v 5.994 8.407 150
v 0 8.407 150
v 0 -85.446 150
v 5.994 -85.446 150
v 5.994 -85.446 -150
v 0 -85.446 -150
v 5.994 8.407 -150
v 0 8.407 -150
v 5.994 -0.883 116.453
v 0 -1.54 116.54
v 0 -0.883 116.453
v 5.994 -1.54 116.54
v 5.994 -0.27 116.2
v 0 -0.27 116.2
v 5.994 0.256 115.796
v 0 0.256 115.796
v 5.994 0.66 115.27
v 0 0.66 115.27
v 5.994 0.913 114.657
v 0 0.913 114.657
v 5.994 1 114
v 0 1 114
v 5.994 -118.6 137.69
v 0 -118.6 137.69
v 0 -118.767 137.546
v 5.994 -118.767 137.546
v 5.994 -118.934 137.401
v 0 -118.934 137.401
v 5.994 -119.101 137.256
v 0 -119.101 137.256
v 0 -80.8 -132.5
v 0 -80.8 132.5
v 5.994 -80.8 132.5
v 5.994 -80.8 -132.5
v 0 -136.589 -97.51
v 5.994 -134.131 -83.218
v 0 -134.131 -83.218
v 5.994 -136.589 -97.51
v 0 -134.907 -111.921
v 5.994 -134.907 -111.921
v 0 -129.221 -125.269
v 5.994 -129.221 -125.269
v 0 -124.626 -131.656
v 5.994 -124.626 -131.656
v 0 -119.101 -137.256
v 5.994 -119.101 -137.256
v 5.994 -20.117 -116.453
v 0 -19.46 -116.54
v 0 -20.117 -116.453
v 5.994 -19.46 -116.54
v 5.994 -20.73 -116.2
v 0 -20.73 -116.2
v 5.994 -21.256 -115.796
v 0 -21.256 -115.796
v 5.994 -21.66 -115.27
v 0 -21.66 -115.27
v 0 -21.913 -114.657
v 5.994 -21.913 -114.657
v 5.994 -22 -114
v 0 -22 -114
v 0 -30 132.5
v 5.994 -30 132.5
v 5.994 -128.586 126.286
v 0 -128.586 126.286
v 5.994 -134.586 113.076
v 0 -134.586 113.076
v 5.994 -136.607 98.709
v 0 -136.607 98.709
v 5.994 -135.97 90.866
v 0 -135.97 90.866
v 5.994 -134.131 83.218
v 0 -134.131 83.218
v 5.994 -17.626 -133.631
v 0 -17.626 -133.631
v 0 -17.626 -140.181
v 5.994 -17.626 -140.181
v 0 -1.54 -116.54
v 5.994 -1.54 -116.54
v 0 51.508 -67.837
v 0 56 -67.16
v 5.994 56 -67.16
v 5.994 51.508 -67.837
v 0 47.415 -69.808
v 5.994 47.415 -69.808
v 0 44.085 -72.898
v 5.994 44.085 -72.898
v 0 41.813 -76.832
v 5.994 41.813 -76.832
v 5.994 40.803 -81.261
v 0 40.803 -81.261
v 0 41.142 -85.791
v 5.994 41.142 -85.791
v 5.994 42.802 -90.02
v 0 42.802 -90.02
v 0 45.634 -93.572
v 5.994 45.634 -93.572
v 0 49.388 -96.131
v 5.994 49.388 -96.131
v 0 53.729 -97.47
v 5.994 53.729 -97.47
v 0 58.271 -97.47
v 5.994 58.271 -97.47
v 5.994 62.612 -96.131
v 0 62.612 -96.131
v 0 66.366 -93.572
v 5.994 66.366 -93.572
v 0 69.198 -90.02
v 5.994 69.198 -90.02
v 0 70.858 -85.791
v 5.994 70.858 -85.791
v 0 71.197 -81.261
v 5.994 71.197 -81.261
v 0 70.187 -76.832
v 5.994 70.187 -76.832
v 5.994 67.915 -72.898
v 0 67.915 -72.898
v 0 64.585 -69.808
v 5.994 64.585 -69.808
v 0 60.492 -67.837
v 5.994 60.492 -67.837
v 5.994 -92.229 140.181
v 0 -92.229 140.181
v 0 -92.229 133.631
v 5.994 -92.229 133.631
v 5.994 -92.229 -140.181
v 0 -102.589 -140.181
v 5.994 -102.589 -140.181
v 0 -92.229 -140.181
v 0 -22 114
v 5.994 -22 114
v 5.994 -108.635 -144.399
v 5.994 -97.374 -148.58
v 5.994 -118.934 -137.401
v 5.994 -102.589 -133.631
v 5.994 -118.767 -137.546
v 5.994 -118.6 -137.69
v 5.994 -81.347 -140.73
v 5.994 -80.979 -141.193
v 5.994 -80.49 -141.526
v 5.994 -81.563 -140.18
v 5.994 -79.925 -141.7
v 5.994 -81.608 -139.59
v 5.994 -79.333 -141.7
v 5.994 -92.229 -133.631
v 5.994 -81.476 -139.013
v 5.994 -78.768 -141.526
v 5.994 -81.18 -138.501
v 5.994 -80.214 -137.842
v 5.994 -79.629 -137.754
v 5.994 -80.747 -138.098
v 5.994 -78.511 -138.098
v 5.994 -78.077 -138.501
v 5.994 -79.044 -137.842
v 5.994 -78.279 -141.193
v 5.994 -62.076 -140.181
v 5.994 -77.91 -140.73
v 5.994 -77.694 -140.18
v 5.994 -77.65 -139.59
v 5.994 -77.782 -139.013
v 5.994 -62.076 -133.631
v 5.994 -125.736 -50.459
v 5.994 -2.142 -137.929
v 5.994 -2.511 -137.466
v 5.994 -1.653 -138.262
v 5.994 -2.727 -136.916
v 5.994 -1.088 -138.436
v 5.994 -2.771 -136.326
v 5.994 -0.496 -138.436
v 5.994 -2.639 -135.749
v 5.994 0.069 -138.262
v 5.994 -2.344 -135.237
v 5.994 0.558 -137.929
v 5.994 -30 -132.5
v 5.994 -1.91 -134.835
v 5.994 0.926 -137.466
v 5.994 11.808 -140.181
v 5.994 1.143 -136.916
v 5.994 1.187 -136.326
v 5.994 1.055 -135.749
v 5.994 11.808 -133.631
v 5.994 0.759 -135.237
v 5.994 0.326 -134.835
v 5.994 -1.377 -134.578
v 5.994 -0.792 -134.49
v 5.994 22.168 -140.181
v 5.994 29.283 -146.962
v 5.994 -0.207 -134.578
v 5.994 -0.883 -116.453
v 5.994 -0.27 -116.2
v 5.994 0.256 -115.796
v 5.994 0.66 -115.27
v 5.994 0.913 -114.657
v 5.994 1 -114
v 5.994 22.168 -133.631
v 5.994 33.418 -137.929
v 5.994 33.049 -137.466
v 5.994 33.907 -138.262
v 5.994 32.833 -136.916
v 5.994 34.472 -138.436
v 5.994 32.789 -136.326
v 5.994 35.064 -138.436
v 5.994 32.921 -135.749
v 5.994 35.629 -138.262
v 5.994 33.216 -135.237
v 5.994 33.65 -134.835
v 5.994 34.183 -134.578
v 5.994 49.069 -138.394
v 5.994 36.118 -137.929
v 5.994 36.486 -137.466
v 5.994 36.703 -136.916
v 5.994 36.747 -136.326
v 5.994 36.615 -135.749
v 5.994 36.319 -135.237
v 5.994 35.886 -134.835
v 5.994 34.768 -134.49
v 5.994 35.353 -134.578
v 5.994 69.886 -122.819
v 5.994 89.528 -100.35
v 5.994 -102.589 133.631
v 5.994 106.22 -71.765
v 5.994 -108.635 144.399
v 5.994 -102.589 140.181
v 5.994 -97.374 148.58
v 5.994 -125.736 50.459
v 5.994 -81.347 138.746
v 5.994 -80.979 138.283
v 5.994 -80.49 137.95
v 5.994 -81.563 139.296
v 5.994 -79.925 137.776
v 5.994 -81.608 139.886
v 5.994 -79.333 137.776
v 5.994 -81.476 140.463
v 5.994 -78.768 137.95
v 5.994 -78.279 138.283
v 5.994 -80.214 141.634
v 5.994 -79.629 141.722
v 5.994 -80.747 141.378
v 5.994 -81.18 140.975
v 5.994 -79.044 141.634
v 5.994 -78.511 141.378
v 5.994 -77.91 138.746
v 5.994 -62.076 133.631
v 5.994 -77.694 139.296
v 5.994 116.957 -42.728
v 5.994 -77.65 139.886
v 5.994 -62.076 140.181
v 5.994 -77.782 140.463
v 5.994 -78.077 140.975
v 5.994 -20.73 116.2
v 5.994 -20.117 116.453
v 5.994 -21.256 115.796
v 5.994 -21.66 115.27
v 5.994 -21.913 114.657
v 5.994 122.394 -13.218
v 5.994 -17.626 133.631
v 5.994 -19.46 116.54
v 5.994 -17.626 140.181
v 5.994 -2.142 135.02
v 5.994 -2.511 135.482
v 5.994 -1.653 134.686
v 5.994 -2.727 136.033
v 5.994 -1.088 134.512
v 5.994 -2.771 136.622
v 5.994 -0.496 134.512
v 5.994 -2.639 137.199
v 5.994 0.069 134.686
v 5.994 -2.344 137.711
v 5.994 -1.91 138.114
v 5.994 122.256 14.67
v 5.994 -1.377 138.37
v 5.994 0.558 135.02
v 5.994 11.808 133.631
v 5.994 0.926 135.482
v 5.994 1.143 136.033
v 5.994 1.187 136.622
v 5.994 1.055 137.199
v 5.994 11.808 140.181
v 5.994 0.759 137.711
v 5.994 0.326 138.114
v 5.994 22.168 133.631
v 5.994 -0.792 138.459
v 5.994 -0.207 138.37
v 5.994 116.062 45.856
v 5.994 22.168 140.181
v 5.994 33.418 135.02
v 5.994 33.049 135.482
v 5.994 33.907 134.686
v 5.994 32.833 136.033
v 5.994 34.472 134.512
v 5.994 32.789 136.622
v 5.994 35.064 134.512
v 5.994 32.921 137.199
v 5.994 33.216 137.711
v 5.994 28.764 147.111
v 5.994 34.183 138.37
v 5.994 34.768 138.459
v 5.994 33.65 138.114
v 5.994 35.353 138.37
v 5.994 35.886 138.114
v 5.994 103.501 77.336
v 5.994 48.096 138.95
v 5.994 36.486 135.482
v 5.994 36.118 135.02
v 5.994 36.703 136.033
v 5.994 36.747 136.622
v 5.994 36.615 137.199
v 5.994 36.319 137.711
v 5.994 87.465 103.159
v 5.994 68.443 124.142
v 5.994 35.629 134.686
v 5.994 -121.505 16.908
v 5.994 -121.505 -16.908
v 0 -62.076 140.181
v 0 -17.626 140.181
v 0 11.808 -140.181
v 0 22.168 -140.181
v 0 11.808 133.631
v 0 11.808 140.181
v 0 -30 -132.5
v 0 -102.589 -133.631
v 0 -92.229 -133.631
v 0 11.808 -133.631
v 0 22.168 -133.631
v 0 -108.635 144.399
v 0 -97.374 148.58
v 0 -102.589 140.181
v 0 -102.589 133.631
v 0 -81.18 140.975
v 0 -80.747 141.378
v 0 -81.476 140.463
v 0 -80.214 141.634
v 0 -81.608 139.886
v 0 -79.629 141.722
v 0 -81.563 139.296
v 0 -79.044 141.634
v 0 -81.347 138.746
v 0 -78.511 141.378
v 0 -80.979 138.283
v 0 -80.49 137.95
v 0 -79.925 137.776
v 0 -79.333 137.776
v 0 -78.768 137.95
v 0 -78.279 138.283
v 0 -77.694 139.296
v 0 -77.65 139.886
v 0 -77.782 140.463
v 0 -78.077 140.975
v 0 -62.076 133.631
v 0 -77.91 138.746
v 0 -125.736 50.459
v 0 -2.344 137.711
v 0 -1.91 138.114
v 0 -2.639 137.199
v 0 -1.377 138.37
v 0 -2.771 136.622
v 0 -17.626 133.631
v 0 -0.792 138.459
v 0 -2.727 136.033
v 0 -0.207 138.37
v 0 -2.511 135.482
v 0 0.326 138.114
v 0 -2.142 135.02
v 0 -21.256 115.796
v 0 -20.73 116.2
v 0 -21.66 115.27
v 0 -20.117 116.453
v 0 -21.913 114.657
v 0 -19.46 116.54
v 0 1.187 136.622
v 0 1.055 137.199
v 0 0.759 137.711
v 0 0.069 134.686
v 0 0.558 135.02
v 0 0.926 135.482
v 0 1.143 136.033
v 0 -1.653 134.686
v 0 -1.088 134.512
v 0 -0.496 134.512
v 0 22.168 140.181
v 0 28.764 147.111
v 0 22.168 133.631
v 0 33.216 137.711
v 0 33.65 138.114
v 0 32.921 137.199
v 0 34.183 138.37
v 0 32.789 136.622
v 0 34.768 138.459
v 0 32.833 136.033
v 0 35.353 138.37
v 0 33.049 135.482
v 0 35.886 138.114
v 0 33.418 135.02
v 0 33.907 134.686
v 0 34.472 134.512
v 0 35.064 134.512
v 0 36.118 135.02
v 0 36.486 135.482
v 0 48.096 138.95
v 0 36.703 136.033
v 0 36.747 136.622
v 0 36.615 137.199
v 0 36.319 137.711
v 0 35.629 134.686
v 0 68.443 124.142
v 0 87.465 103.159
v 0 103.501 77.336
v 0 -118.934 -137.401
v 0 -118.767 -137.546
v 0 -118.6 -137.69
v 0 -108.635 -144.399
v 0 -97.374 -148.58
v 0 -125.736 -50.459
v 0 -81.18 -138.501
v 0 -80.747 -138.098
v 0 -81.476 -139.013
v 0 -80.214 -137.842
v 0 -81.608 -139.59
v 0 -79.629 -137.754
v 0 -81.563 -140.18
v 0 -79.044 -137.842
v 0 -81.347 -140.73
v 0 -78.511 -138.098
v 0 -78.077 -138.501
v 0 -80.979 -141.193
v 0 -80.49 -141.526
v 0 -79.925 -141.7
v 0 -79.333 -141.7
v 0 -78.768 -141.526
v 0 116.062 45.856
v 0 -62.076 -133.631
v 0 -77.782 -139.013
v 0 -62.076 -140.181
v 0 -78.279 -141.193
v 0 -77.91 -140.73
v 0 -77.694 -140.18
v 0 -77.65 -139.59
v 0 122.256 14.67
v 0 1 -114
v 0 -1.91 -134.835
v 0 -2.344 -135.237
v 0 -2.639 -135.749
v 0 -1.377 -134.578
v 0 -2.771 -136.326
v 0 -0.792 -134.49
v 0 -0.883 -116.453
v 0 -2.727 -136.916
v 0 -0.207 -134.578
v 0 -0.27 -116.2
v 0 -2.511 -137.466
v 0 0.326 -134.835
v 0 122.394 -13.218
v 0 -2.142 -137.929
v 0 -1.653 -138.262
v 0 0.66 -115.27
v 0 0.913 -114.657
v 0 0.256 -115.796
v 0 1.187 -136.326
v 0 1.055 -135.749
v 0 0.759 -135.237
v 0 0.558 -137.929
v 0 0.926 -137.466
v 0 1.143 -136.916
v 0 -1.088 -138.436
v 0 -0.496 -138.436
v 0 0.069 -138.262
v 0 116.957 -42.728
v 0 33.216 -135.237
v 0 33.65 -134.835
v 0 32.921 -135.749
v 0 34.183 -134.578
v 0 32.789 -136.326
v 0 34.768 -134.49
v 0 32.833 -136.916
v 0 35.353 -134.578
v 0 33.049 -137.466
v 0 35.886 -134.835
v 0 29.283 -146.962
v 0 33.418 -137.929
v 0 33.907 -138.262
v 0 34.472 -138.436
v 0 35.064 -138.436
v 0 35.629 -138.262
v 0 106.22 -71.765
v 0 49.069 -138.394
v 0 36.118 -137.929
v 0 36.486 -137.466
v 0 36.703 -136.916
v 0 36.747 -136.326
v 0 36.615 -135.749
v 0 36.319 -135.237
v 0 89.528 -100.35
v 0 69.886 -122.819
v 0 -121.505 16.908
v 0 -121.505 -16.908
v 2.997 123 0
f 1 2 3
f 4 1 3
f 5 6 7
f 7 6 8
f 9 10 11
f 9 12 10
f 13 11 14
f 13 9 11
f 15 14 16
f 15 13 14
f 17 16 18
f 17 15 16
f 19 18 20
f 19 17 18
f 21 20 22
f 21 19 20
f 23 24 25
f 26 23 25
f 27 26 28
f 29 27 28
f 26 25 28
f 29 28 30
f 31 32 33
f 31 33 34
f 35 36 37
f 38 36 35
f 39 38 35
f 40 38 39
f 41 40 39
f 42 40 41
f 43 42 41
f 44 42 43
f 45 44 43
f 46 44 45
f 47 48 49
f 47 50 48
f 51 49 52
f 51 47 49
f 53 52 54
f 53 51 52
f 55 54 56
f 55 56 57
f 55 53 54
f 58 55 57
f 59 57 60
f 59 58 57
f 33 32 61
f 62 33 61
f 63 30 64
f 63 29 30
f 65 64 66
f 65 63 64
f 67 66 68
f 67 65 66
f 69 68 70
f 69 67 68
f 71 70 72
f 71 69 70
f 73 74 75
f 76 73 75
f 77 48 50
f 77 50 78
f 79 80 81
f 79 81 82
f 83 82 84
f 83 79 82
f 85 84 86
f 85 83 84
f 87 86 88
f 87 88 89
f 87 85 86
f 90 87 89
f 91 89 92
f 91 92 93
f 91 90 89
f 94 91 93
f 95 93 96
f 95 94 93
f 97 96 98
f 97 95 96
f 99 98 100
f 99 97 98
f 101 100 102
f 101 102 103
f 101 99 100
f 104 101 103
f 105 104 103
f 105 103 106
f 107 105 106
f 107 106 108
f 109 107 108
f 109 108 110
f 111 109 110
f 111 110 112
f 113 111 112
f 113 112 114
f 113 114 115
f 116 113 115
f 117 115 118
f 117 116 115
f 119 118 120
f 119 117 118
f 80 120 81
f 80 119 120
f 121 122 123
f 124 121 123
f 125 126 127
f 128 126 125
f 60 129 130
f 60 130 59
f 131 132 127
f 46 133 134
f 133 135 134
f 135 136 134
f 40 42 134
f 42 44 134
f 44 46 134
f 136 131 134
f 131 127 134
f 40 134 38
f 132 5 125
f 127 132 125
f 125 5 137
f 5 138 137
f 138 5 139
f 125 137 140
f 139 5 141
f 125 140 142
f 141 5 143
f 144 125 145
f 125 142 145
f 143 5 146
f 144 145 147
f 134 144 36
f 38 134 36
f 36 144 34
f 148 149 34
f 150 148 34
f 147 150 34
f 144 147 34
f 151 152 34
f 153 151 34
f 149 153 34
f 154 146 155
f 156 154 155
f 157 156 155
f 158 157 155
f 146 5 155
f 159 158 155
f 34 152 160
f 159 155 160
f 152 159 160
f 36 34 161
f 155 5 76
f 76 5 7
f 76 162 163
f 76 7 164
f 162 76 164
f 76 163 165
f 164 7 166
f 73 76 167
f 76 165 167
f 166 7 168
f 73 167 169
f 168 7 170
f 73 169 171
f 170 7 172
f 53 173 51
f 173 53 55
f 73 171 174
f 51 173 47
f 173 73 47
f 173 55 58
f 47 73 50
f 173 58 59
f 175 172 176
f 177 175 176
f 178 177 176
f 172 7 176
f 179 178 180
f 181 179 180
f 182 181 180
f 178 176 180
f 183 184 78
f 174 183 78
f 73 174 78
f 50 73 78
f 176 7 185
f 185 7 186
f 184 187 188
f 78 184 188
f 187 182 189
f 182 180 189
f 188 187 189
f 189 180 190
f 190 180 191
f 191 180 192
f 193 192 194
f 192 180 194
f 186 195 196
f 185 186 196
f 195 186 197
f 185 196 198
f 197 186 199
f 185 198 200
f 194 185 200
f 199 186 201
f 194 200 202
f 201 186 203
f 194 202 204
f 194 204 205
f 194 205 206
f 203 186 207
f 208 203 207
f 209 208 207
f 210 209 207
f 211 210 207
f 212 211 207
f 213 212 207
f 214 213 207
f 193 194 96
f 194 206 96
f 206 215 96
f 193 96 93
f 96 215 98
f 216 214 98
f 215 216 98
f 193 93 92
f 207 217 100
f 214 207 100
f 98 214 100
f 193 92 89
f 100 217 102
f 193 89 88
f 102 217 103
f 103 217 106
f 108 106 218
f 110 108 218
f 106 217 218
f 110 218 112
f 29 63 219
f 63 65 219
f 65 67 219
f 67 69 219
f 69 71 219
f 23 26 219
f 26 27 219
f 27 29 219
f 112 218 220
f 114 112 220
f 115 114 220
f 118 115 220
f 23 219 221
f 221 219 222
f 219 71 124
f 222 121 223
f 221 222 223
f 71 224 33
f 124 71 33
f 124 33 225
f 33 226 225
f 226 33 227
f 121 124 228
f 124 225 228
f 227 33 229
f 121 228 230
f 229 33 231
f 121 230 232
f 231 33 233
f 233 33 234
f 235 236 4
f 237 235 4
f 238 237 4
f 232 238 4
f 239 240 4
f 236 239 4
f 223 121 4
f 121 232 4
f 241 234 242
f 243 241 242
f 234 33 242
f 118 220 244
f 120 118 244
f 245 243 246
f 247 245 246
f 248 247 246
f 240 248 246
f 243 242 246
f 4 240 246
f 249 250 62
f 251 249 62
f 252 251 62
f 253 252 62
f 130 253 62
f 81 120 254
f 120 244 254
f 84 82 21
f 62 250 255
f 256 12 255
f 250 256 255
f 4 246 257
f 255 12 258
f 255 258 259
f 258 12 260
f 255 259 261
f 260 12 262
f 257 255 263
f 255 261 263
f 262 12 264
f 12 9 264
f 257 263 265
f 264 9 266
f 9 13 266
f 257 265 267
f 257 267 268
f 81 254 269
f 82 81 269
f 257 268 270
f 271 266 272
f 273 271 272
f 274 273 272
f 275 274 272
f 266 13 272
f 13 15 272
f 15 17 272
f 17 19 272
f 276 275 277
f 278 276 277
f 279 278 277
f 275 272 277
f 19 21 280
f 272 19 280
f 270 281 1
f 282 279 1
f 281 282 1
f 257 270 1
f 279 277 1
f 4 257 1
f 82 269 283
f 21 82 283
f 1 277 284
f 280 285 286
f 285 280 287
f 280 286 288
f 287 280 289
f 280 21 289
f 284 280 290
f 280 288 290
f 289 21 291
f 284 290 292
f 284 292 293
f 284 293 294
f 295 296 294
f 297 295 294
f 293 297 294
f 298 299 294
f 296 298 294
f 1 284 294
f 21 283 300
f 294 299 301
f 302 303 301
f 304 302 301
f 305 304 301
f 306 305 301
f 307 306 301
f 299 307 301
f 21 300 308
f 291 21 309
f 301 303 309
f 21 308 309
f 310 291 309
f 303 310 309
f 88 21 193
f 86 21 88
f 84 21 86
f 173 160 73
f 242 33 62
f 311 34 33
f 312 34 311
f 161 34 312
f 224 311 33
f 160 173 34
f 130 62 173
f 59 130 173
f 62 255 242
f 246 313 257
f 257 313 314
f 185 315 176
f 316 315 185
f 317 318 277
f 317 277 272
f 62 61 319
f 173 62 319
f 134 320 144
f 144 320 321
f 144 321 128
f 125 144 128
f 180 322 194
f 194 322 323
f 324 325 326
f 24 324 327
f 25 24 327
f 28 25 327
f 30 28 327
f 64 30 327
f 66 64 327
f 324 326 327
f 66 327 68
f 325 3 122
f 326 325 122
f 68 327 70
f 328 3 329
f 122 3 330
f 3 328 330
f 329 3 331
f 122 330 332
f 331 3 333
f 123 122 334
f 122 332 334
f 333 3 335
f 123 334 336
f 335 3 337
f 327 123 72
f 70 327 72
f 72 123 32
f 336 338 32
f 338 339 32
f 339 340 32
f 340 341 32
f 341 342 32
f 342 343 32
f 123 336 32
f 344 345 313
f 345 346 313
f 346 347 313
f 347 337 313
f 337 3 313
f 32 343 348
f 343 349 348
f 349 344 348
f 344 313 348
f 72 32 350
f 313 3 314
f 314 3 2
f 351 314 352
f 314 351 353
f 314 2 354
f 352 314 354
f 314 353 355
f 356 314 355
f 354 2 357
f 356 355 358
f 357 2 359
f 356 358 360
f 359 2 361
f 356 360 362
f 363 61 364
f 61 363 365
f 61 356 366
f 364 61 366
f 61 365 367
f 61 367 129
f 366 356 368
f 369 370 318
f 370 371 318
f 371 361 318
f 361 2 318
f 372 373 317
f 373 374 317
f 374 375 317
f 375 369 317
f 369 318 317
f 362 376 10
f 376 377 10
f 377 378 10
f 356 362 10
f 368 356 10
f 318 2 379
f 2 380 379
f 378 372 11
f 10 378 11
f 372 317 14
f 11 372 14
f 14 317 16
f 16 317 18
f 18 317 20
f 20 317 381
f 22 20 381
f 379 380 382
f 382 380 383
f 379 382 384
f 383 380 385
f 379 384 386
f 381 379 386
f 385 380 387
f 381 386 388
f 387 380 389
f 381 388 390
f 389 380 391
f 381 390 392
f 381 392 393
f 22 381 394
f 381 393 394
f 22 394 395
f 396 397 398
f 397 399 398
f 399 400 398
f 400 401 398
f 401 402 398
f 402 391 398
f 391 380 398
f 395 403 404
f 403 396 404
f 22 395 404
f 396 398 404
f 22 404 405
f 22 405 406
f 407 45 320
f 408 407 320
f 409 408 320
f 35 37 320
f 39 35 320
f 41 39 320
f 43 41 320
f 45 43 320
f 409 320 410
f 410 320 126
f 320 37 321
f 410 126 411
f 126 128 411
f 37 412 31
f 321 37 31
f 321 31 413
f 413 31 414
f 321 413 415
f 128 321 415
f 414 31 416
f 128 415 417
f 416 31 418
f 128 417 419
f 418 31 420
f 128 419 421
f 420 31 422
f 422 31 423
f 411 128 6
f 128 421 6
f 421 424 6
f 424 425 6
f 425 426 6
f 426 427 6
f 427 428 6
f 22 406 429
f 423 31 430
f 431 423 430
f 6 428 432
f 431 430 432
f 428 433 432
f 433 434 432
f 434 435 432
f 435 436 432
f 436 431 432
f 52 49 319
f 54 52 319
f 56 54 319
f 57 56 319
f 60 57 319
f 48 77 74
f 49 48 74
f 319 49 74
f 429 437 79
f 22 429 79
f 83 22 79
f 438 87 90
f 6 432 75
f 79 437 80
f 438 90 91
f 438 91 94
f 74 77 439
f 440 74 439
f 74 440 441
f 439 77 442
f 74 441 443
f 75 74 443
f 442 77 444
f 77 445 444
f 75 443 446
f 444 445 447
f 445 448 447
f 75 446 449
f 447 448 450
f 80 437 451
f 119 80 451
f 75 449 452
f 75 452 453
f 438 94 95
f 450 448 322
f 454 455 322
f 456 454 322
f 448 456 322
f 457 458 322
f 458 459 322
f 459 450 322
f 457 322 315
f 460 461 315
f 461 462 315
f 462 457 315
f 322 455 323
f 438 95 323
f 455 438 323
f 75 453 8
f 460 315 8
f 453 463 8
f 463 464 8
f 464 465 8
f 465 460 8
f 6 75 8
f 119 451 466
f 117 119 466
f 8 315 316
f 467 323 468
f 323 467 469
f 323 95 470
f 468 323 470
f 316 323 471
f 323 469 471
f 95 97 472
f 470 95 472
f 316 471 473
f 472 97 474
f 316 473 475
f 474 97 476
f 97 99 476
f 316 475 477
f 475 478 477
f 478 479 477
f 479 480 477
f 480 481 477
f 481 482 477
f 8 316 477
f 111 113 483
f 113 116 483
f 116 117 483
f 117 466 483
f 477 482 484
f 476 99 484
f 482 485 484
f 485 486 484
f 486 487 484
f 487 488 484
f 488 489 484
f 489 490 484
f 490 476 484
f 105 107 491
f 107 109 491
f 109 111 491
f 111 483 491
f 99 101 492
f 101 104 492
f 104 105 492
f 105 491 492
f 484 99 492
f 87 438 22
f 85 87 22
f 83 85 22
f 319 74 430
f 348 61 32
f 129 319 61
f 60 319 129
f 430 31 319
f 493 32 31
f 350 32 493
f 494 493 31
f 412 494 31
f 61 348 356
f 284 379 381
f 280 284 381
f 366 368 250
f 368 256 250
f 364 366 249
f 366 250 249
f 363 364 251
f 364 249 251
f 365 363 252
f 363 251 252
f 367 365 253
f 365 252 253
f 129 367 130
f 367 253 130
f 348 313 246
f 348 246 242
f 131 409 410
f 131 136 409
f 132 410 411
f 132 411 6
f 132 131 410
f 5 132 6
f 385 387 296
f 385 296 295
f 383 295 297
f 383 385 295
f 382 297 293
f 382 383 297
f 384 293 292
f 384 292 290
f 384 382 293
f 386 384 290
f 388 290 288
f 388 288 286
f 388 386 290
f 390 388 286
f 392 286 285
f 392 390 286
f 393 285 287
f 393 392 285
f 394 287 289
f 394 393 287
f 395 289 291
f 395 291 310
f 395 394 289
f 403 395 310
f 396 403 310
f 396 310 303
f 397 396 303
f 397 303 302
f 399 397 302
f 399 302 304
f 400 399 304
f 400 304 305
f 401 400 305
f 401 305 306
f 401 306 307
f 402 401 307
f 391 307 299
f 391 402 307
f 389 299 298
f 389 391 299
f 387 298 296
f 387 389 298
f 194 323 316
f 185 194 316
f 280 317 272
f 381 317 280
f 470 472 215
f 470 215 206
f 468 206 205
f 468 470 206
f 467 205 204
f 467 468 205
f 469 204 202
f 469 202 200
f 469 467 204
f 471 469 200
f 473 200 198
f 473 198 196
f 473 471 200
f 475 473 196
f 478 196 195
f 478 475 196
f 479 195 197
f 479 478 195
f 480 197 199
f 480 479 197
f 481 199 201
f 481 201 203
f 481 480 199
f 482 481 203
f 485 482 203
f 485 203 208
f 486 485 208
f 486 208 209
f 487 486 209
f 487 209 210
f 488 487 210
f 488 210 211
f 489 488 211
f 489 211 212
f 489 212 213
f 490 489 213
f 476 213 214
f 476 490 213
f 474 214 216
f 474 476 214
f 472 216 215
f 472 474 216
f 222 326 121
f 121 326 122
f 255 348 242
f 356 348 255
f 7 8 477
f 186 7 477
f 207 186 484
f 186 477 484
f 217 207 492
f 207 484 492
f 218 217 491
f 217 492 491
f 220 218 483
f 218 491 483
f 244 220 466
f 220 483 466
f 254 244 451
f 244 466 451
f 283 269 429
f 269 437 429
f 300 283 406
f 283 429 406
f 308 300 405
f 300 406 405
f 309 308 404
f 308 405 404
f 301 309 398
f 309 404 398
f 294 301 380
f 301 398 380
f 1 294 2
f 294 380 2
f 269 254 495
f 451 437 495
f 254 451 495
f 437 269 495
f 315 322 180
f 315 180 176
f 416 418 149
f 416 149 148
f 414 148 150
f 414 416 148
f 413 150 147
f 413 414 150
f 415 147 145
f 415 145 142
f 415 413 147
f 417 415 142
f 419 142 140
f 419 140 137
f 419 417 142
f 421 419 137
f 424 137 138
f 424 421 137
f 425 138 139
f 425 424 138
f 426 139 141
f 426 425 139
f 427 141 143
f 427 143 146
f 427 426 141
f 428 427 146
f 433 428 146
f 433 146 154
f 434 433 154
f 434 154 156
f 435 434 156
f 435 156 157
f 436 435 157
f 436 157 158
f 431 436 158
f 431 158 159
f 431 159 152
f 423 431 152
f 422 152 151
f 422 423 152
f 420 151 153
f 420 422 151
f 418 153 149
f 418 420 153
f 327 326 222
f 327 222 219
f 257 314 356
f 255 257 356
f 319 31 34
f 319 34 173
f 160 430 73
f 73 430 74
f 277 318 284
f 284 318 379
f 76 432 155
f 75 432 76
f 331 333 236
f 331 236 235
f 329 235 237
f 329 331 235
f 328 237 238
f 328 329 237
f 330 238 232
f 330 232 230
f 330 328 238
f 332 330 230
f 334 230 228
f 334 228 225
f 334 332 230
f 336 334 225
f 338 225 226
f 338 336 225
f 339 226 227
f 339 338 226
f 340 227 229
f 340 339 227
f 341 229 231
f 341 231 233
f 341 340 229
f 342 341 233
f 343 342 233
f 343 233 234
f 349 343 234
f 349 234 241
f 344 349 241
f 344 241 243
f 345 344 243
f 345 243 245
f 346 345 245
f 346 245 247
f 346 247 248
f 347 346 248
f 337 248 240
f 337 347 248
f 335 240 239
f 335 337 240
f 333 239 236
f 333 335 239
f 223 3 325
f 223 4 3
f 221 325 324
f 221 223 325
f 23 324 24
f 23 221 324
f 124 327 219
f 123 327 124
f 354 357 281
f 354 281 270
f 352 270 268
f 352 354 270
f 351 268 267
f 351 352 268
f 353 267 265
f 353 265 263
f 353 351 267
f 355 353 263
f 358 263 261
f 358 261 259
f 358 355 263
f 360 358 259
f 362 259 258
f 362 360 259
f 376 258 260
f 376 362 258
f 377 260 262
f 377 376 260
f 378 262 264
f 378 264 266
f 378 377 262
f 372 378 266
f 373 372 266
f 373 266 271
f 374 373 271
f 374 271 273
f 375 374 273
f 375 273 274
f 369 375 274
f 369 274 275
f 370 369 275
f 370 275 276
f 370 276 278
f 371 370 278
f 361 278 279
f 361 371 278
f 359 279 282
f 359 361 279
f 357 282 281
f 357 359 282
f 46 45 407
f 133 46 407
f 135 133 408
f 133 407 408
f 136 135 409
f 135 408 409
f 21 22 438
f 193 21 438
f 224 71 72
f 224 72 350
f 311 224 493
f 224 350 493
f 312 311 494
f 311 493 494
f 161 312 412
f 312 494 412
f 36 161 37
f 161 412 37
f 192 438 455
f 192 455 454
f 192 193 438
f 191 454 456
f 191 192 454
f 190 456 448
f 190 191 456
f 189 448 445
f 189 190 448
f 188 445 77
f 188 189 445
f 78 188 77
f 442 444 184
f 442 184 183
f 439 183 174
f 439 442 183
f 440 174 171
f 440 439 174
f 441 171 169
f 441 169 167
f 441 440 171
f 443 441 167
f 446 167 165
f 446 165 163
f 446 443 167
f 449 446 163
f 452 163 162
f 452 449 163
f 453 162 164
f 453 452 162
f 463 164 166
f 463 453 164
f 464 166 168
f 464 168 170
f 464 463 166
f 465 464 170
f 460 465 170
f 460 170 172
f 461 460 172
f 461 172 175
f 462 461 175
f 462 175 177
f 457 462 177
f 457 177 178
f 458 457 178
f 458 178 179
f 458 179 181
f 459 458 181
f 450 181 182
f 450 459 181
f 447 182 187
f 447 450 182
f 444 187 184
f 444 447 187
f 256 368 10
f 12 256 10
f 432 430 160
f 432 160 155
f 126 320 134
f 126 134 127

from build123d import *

# Parameters (mm, degrees)
SKETCH1_R      = 2.54
SKETCH1_W      = 6.55
SKETCH1_H      = 10.36
SKETCH1_R_2    = 1.984375
SKETCH1_H_2    = 44.45
SKETCH1_W_2    = 265
SKETCH1_H_3    = 50.8
SKETCH1_W_3    = 233.08
SKETCH1_H_4    = 23
SKETCH1_R_3    = 15.24
EXTRUDE1_DEPTH = 5.9944
FILLET3_R      = 50.8
FILLET4_R      = 50.8
FILLET5_R      = 50.8
FILLET6_R      = 50.8
FILLET12_R     = 2.54
FILLET13_R     = 2.54
FILLET14_R     = 2.54
FILLET15_R     = 2.54


with BuildPart() as part:
    # Sketch1 → Extrude1 (new body)
    # profile 1 of 2: a face of its own
    with BuildSketch(Plane(origin=(0, 0, 0), x_dir=(0, 0, -1), z_dir=(1, 0, 0))):
        with BuildLine():
            add(Edge.make_bspline(
                [(-150, 8.40657677), (-150, 69.992291428), (-70.289643695, 123), (0, 123)],
                knots=[0, 0, 0, 0, 1, 1, 1, 1], degree=3))
            Line((-150, 8.40657677), (-150, -102.588801706))
            ThreePointArc((-150, -102.588801706), (-131.77407574, -125.140142234), (-110.193405103, -144.505625175))
            ThreePointArc((-110.193405103, -144.505625175), (0, -120.975050934), (110.193405103, -144.505625175))
            ThreePointArc((110.193405103, -144.505625175), (131.77407574, -125.140142234), (150, -102.588801706))
            Line((150, -102.588801706), (150, 8.40657677))
            add(Edge.make_bspline(
                [(150, 8.40657677), (150, 69.992291428), (70.289643695, 123), (0, 123)],
                knots=[0, 0, 0, 0, 1, 1, 1, 1], degree=3))
        make_face()
        with Locations((-16.764, -115.55684695)):
            Circle(SKETCH1_R, mode=Mode.SUBTRACT)
        with Locations((-136.906, -97.408801706)):
            Rectangle(SKETCH1_W, SKETCH1_H, mode=Mode.SUBTRACT)
        with Locations(Location((-139.738064794, -79.628801706, 0), (0, 0, 180))):
            Circle(SKETCH1_R_2, mode=Mode.SUBTRACT)
        with Locations((-136.906, -39.850801706)):
            Rectangle(SKETCH1_W, SKETCH1_H_2, mode=Mode.SUBTRACT)
        with Locations((0, -55.4)):
            Rectangle(SKETCH1_W_2, SKETCH1_H_3, mode=Mode.SUBTRACT)
        with Locations((136.906, -97.408801706)):
            Rectangle(SKETCH1_W, SKETCH1_H, mode=Mode.SUBTRACT)
        with Locations(Location((139.738064794, -79.628801706, 0), (0, 0, 180))):
            Circle(SKETCH1_R_2, mode=Mode.SUBTRACT)
        with Locations((136.906, -39.850801706)):
            Rectangle(SKETCH1_W, SKETCH1_H_2, mode=Mode.SUBTRACT)
        with Locations(Location((-136.4742, -0.792101706, 0), (0, 0, 180))):
            Circle(SKETCH1_R_2, mode=Mode.SUBTRACT)
        with Locations((-136.906, 16.987898294)):
            Rectangle(SKETCH1_W, SKETCH1_H, mode=Mode.SUBTRACT)
        with Locations(Location((-136.4742, 34.767898294, 0), (0, 0, 180))):
            Circle(SKETCH1_R_2, mode=Mode.SUBTRACT)
        with Locations((0, -10.5)):
            Rectangle(SKETCH1_W_3, SKETCH1_H_4, mode=Mode.SUBTRACT)
        with Locations(Location((136.4742, -0.792101706, 0), (0, 0, 180))):
            Circle(SKETCH1_R_2, mode=Mode.SUBTRACT)
        with Locations((136.906, 16.987898294)):
            Rectangle(SKETCH1_W, SKETCH1_H, mode=Mode.SUBTRACT)
        with Locations(Location((136.4742, 34.767898294, 0), (0, 0, 180))):
            Circle(SKETCH1_R_2, mode=Mode.SUBTRACT)
        with Locations(Location((82.4, 56, 0), (0, 0, 180))):
            Circle(SKETCH1_R_3, mode=Mode.SUBTRACT)
    # profile 2 of 2: a face of its own
    with BuildSketch(Plane(origin=(0, 0, 0), x_dir=(0, 0, -1), z_dir=(1, 0, 0))):
        with Locations((-16.764, -115.55684695)):
            Circle(SKETCH1_R)
    extrude(amount=EXTRUDE1_DEPTH)

    # Fillet3
    fillet3_edges = [part.edges().sort_by_distance(p)[0] for p in [
        (2.9972, -102.588801706, 150),
    ]]
    fillet(fillet3_edges, radius=FILLET3_R)

    # Fillet4
    fillet4_edges = [part.edges().sort_by_distance(p)[0] for p in [
        (2.9972, -144.505625175, 110.193405103),
    ]]
    fillet(fillet4_edges, radius=FILLET4_R)

    # Fillet5
    fillet5_edges = [part.edges().sort_by_distance(p)[0] for p in [
        (2.9972, -144.505625175, -110.193405103),
    ]]
    fillet(fillet5_edges, radius=FILLET5_R)

    # Fillet6
    fillet6_edges = [part.edges().sort_by_distance(p)[0] for p in [
        (2.9972, -102.588801706, -150),
    ]]
    fillet(fillet6_edges, radius=FILLET6_R)

    # Fillet12
    fillet12_edges = [part.edges().sort_by_distance(p)[0] for p in [
        (2.9972, -22, 116.54),
    ]]
    fillet(fillet12_edges, radius=FILLET12_R)

    # Fillet13
    fillet13_edges = [part.edges().sort_by_distance(p)[0] for p in [
        (2.9972, 1, 116.54),
    ]]
    fillet(fillet13_edges, radius=FILLET13_R)

    # Fillet14
    fillet14_edges = [part.edges().sort_by_distance(p)[0] for p in [
        (2.9972, 1, -116.54),
    ]]
    fillet(fillet14_edges, radius=FILLET14_R)

    # Fillet15
    fillet15_edges = [part.edges().sort_by_distance(p)[0] for p in [
        (2.9972, -22, -116.54),
    ]]
    fillet(fillet15_edges, radius=FILLET15_R)


solid = part.part
